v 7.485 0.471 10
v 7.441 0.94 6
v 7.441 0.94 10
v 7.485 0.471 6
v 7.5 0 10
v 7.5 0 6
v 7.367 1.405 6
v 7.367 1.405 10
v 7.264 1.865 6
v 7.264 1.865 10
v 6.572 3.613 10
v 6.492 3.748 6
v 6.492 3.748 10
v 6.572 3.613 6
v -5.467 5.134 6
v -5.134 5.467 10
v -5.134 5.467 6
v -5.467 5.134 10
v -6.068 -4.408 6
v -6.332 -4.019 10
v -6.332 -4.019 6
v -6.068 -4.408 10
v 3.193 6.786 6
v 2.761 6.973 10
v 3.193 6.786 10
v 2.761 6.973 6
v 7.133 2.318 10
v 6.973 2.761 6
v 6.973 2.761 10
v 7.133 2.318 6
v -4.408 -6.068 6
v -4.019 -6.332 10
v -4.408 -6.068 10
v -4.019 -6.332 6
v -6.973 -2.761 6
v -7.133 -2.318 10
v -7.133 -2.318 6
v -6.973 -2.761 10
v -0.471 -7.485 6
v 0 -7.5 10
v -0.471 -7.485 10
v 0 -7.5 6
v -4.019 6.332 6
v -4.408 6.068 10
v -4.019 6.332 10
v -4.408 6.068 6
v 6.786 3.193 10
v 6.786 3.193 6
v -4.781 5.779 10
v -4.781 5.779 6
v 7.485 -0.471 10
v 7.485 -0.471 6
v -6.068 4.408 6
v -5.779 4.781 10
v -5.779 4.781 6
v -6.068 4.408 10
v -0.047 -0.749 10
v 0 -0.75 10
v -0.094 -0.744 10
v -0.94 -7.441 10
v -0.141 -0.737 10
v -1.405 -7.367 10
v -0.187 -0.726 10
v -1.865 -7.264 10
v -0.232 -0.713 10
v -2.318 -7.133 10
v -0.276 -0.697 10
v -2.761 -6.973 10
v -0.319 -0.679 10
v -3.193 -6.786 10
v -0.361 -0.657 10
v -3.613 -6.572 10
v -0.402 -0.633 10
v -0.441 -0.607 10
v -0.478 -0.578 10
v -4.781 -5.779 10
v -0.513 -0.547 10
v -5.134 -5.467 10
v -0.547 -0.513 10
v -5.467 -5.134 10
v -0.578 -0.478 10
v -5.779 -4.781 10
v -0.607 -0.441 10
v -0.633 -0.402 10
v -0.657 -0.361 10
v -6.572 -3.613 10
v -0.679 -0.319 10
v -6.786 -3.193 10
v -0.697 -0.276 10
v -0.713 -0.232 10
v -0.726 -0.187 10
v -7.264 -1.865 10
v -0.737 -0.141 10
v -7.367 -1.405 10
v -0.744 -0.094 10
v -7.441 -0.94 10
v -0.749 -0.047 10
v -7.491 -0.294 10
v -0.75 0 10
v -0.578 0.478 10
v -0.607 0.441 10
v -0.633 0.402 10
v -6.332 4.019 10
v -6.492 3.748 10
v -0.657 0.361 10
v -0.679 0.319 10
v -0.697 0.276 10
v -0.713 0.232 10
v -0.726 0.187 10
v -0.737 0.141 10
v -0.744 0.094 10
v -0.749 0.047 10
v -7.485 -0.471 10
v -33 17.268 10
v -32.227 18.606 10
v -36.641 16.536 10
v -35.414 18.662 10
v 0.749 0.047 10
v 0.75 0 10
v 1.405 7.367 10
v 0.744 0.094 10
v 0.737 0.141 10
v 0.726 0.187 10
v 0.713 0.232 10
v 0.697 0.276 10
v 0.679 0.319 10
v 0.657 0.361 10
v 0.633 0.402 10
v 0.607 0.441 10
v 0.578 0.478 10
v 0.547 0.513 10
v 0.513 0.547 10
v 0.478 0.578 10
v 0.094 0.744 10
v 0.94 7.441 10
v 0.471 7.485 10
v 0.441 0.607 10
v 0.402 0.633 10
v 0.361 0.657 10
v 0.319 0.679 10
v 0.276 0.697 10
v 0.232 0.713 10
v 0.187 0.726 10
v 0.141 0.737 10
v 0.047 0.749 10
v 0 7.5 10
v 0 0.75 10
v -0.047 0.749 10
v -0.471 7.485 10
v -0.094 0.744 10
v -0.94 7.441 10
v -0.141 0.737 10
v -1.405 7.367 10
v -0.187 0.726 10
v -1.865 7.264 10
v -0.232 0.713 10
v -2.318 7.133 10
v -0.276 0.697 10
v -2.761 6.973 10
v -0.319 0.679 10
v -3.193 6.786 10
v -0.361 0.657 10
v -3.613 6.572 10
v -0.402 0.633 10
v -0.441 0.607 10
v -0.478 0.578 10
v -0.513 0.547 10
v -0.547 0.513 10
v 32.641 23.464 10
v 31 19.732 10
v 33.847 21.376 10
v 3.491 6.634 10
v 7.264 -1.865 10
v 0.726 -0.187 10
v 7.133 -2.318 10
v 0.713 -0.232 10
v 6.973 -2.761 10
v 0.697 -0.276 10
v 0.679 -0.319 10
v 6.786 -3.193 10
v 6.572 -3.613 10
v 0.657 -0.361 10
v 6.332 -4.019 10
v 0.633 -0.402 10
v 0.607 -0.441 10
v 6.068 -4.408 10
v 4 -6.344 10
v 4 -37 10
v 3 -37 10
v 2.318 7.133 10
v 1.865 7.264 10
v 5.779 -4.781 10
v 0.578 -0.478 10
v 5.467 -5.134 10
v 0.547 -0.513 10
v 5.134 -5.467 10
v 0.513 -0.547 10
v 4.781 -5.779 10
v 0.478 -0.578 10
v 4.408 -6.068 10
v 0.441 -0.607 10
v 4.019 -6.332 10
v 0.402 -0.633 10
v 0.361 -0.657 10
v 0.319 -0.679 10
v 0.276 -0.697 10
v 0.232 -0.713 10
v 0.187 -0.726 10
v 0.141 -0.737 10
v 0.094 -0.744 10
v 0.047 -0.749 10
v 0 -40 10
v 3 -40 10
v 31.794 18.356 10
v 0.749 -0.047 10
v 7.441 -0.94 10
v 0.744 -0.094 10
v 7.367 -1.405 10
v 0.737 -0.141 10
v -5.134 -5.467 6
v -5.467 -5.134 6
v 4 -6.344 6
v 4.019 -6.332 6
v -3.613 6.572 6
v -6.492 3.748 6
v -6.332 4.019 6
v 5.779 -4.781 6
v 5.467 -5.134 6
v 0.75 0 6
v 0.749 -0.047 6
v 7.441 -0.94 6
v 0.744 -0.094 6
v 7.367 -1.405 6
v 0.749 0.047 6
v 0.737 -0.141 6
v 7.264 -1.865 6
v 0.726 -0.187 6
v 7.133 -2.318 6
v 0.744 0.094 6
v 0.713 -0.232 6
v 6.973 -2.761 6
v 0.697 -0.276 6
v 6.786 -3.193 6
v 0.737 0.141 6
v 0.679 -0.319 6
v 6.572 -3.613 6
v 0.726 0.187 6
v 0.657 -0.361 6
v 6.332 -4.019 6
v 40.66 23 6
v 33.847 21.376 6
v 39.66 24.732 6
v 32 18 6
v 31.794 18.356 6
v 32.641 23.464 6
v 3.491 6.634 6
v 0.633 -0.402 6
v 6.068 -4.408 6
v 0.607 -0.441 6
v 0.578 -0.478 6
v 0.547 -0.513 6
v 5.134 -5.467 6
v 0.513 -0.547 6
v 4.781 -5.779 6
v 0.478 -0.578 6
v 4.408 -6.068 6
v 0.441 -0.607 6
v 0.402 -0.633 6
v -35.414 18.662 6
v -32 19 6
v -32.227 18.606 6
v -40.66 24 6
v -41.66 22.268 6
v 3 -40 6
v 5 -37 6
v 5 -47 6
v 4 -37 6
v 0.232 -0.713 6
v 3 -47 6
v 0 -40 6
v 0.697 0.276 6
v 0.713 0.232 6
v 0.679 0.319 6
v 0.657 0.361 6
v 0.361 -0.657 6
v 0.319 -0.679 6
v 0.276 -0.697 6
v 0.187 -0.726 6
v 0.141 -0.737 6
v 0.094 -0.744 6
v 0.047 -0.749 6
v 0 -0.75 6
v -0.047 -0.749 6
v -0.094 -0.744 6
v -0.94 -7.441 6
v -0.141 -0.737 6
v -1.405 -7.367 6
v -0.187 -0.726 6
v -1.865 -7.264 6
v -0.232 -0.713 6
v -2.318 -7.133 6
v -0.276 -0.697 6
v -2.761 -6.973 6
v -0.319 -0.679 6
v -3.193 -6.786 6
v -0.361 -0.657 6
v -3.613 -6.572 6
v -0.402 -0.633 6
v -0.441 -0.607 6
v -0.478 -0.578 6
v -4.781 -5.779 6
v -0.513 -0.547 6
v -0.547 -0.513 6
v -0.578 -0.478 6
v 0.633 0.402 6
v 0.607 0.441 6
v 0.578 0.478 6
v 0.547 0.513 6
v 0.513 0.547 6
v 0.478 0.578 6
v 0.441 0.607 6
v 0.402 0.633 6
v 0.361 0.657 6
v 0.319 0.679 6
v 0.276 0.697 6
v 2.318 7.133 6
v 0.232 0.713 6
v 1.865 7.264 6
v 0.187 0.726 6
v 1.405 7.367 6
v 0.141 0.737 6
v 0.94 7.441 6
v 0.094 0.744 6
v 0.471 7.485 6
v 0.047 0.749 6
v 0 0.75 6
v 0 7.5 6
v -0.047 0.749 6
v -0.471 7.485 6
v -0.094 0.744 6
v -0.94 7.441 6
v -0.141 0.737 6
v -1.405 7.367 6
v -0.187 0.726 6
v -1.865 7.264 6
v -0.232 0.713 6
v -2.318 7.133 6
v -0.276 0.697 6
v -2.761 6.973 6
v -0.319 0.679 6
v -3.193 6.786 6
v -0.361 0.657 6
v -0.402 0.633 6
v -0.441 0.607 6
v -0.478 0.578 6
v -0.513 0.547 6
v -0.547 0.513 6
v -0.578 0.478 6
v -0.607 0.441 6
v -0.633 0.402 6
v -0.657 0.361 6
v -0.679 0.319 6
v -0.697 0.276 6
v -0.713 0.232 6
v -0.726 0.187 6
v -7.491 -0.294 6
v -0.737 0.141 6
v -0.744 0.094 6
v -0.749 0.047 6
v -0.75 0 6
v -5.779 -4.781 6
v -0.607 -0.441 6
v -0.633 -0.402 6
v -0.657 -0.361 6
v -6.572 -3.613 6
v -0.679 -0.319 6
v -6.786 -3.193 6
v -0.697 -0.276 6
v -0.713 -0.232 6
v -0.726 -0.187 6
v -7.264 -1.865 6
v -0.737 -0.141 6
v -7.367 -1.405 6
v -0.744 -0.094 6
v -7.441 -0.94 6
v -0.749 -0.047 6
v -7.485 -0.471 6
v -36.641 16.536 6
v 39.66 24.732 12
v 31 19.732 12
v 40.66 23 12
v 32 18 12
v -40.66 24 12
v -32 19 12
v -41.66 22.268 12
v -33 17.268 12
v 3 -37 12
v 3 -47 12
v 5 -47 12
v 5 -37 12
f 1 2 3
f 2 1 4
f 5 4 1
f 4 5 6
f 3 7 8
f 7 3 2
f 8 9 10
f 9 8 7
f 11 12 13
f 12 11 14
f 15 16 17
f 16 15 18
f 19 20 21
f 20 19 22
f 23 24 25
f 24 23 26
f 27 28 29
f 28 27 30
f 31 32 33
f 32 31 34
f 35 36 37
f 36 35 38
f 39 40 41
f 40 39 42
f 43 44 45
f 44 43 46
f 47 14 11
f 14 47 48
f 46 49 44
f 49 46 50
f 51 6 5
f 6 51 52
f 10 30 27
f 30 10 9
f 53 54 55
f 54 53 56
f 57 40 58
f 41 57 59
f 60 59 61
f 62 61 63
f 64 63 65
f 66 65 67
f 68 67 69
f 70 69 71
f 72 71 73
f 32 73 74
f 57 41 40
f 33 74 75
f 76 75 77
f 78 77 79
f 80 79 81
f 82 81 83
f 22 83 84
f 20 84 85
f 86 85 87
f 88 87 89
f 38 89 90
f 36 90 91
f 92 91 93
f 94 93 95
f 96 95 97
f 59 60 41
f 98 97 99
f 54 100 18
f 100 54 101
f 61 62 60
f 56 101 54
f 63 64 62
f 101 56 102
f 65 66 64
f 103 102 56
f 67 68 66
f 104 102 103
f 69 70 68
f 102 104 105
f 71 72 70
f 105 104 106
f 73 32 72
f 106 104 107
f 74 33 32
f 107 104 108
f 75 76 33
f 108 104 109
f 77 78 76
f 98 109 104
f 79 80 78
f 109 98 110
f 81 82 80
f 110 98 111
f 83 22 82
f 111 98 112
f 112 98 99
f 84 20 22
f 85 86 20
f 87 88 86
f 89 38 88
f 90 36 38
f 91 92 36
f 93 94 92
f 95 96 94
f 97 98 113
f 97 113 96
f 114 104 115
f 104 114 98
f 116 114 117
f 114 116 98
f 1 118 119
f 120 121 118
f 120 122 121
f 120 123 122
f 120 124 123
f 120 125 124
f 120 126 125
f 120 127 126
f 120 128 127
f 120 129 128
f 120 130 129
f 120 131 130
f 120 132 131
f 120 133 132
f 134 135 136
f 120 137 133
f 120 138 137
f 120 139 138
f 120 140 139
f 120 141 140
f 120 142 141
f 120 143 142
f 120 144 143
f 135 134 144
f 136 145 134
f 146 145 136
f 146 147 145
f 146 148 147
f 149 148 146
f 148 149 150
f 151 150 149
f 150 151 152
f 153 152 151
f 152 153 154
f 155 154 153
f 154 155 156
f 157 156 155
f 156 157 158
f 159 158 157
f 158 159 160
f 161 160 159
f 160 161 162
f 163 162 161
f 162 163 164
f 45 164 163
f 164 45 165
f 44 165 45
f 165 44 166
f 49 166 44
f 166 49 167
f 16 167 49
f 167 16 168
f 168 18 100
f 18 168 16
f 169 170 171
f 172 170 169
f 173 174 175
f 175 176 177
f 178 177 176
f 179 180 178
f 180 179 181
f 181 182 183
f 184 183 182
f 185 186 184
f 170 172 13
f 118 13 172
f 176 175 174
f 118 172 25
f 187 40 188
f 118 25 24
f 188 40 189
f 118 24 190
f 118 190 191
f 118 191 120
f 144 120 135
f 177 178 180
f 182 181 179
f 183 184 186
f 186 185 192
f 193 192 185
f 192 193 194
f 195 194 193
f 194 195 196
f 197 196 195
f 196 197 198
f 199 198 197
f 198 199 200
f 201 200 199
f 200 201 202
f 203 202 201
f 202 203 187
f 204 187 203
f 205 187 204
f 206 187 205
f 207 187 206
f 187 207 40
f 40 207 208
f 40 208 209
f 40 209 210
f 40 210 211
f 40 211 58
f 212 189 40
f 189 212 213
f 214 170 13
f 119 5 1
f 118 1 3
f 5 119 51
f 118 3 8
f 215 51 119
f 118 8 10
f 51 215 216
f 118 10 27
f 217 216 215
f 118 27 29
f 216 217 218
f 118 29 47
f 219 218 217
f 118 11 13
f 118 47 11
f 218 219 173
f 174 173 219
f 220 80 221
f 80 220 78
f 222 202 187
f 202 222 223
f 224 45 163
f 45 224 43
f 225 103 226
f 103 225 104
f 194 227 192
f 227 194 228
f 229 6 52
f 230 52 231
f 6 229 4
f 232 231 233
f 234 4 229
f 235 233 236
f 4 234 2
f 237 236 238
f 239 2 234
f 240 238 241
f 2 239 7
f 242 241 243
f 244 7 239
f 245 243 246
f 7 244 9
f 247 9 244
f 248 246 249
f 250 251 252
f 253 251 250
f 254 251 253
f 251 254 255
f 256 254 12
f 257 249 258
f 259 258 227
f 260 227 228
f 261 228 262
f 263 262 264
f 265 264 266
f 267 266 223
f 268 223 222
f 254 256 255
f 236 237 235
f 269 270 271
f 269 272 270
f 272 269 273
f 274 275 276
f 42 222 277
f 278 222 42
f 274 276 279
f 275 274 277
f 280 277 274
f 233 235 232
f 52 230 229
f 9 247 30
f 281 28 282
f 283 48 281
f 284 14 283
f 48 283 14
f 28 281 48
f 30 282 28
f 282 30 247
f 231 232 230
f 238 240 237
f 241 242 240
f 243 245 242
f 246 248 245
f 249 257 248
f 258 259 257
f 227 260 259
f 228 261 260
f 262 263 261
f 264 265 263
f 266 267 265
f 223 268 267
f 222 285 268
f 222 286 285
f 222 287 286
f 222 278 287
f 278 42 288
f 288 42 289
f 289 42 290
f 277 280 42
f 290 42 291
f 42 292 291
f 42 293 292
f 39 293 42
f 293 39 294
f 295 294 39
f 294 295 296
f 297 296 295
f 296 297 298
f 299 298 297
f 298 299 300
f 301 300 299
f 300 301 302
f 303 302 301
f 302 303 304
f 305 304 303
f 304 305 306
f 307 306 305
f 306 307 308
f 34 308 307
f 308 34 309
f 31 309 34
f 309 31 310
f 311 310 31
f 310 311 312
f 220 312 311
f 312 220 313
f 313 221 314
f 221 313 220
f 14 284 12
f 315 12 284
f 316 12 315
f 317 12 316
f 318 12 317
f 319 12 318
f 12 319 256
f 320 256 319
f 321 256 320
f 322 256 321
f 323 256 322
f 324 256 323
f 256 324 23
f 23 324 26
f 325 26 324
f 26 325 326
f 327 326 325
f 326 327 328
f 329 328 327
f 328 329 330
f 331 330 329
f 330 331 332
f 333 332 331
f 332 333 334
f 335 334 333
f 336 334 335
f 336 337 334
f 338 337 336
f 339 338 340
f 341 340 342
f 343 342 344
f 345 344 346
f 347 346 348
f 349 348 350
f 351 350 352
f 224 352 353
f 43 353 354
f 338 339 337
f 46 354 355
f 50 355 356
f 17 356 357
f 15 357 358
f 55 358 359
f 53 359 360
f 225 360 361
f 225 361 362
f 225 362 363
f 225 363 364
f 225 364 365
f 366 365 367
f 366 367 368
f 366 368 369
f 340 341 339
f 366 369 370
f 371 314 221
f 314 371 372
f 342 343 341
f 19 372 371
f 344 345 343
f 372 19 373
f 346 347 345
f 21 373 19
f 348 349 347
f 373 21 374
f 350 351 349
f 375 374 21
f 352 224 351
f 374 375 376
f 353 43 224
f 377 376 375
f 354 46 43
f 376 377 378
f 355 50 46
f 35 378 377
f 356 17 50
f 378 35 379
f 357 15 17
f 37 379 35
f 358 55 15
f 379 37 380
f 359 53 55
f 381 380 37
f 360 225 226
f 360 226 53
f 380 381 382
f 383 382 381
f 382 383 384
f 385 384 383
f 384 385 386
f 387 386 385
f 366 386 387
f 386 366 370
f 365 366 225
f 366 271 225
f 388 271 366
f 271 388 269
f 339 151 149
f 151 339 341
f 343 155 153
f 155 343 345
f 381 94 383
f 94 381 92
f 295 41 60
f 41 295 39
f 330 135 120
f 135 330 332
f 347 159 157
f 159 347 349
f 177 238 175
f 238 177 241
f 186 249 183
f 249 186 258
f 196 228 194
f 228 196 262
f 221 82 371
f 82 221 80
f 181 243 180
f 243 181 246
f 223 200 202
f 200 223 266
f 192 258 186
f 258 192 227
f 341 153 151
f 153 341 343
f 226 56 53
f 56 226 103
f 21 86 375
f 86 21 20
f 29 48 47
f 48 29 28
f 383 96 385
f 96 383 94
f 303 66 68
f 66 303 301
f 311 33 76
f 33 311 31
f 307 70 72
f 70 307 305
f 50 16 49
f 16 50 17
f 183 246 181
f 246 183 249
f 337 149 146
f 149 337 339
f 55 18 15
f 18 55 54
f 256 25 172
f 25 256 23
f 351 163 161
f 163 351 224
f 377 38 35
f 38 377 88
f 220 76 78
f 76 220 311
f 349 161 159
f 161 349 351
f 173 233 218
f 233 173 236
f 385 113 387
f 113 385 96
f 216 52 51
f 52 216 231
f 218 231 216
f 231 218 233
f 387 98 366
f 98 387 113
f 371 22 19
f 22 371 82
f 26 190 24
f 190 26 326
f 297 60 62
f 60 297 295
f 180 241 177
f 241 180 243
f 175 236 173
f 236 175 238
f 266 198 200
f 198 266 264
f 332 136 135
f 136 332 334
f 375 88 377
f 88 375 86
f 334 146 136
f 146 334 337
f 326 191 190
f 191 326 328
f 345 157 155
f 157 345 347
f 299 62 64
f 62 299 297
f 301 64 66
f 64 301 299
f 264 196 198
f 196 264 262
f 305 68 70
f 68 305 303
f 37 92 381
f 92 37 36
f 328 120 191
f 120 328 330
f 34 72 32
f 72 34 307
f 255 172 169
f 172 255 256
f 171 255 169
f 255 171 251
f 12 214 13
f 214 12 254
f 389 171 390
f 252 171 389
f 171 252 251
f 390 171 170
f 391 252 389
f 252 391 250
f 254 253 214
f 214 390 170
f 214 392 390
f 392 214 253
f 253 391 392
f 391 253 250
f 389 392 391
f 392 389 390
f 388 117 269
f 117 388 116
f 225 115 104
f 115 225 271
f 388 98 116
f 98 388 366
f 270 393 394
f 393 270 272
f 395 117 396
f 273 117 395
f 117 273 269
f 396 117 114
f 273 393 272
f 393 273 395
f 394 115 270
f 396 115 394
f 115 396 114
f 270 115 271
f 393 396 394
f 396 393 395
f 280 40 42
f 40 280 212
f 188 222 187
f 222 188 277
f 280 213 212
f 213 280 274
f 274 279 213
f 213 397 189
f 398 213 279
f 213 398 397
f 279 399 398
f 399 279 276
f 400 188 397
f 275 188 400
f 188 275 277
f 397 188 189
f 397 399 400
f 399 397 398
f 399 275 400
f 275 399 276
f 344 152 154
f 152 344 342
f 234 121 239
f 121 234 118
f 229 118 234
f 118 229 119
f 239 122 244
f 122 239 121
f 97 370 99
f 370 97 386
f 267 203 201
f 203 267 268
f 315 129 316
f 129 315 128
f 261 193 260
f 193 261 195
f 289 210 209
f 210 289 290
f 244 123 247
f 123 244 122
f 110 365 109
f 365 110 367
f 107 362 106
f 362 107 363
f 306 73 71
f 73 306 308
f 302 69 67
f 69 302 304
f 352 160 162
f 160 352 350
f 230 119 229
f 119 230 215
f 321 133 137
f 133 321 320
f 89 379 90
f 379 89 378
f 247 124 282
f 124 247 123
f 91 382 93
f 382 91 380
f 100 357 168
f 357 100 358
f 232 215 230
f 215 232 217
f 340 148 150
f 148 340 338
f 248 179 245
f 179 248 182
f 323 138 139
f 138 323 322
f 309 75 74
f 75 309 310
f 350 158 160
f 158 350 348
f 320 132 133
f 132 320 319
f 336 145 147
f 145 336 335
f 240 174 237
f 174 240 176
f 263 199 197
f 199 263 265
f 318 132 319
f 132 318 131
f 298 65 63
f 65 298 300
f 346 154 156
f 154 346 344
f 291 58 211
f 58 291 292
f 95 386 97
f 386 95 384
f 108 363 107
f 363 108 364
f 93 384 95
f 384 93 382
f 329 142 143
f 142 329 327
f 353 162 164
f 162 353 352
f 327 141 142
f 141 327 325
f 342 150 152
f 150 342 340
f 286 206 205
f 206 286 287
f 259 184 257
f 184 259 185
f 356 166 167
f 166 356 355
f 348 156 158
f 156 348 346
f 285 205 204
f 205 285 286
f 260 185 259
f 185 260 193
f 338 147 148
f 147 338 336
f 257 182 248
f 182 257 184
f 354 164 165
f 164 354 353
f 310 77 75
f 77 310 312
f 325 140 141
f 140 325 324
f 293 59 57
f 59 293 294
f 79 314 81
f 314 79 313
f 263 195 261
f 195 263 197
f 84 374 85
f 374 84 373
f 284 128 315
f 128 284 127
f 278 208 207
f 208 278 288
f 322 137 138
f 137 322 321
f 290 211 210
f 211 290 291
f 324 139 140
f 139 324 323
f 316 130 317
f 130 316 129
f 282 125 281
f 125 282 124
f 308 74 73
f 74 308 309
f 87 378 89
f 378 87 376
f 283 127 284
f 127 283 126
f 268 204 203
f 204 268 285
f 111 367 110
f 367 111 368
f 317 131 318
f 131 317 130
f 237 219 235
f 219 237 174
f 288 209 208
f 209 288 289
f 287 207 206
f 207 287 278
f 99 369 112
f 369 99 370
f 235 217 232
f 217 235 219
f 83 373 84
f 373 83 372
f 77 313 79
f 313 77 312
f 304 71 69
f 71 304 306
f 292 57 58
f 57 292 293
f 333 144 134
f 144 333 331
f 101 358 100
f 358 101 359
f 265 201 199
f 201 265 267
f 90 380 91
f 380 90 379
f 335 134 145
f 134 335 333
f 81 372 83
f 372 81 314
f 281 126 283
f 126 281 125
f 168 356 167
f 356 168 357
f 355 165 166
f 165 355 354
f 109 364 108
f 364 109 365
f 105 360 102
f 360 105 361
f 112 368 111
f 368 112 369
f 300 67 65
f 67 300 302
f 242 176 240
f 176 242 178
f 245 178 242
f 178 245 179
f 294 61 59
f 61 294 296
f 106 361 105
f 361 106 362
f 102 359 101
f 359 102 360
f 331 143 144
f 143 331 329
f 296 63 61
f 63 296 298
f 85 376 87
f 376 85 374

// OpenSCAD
$fn=100;
//Bearing();
//Shaft();
Top();
//Base();



module Base(){
    difference(){
    translate([0,0,-10]) cylinder(h=14, d=15);
    translate([0,0,3]) cylinder(h=1.5, d=9.5);
    translate([0,0,0]) cylinder(h=4, d=8);
    translate([0,0,-11]) cylinder(h=12, d=13);
}
}

module Shaft(){
    difference(){
    translate([0,0,-3]) cylinder(h=12, d=3);
    translate([0,0,3]) cylinder(h=8, d=1.5);
    }
}

module Top(){
  difference(){
    union(){
        translate([0,0,6]) cylinder(h=4, d=15);
        translate([+0,+0,6])rotate ([90,0,120]) cube ([4,4,40]);
        translate([+32,+18,6])rotate ([90,0,120]) cube ([2,6,10]);
        translate([+0,+0,6])rotate ([90,0,240]) cube ([4,4,40]);
        translate([-32,+19,6])rotate ([90,0,240]) cube ([2,6,10]);
        translate([+0,+0,6])rotate ([90,0,360]) cube ([4,4,40]);
        translate([+3,-37,6])rotate ([90,0,360]) cube ([2,6,10]);
    }
    translate([0,0,3]) cylinder(h=8, d=1.5);
}  
}
module Bearing(){

    difference(){
        union(){
            translate([0,0,3]) cylinder(h=1, d=9.5);
            cylinder(h=3, d=8);
        }
        translate([0,0,-.5])cylinder(h=6, d=3);
    }
}
